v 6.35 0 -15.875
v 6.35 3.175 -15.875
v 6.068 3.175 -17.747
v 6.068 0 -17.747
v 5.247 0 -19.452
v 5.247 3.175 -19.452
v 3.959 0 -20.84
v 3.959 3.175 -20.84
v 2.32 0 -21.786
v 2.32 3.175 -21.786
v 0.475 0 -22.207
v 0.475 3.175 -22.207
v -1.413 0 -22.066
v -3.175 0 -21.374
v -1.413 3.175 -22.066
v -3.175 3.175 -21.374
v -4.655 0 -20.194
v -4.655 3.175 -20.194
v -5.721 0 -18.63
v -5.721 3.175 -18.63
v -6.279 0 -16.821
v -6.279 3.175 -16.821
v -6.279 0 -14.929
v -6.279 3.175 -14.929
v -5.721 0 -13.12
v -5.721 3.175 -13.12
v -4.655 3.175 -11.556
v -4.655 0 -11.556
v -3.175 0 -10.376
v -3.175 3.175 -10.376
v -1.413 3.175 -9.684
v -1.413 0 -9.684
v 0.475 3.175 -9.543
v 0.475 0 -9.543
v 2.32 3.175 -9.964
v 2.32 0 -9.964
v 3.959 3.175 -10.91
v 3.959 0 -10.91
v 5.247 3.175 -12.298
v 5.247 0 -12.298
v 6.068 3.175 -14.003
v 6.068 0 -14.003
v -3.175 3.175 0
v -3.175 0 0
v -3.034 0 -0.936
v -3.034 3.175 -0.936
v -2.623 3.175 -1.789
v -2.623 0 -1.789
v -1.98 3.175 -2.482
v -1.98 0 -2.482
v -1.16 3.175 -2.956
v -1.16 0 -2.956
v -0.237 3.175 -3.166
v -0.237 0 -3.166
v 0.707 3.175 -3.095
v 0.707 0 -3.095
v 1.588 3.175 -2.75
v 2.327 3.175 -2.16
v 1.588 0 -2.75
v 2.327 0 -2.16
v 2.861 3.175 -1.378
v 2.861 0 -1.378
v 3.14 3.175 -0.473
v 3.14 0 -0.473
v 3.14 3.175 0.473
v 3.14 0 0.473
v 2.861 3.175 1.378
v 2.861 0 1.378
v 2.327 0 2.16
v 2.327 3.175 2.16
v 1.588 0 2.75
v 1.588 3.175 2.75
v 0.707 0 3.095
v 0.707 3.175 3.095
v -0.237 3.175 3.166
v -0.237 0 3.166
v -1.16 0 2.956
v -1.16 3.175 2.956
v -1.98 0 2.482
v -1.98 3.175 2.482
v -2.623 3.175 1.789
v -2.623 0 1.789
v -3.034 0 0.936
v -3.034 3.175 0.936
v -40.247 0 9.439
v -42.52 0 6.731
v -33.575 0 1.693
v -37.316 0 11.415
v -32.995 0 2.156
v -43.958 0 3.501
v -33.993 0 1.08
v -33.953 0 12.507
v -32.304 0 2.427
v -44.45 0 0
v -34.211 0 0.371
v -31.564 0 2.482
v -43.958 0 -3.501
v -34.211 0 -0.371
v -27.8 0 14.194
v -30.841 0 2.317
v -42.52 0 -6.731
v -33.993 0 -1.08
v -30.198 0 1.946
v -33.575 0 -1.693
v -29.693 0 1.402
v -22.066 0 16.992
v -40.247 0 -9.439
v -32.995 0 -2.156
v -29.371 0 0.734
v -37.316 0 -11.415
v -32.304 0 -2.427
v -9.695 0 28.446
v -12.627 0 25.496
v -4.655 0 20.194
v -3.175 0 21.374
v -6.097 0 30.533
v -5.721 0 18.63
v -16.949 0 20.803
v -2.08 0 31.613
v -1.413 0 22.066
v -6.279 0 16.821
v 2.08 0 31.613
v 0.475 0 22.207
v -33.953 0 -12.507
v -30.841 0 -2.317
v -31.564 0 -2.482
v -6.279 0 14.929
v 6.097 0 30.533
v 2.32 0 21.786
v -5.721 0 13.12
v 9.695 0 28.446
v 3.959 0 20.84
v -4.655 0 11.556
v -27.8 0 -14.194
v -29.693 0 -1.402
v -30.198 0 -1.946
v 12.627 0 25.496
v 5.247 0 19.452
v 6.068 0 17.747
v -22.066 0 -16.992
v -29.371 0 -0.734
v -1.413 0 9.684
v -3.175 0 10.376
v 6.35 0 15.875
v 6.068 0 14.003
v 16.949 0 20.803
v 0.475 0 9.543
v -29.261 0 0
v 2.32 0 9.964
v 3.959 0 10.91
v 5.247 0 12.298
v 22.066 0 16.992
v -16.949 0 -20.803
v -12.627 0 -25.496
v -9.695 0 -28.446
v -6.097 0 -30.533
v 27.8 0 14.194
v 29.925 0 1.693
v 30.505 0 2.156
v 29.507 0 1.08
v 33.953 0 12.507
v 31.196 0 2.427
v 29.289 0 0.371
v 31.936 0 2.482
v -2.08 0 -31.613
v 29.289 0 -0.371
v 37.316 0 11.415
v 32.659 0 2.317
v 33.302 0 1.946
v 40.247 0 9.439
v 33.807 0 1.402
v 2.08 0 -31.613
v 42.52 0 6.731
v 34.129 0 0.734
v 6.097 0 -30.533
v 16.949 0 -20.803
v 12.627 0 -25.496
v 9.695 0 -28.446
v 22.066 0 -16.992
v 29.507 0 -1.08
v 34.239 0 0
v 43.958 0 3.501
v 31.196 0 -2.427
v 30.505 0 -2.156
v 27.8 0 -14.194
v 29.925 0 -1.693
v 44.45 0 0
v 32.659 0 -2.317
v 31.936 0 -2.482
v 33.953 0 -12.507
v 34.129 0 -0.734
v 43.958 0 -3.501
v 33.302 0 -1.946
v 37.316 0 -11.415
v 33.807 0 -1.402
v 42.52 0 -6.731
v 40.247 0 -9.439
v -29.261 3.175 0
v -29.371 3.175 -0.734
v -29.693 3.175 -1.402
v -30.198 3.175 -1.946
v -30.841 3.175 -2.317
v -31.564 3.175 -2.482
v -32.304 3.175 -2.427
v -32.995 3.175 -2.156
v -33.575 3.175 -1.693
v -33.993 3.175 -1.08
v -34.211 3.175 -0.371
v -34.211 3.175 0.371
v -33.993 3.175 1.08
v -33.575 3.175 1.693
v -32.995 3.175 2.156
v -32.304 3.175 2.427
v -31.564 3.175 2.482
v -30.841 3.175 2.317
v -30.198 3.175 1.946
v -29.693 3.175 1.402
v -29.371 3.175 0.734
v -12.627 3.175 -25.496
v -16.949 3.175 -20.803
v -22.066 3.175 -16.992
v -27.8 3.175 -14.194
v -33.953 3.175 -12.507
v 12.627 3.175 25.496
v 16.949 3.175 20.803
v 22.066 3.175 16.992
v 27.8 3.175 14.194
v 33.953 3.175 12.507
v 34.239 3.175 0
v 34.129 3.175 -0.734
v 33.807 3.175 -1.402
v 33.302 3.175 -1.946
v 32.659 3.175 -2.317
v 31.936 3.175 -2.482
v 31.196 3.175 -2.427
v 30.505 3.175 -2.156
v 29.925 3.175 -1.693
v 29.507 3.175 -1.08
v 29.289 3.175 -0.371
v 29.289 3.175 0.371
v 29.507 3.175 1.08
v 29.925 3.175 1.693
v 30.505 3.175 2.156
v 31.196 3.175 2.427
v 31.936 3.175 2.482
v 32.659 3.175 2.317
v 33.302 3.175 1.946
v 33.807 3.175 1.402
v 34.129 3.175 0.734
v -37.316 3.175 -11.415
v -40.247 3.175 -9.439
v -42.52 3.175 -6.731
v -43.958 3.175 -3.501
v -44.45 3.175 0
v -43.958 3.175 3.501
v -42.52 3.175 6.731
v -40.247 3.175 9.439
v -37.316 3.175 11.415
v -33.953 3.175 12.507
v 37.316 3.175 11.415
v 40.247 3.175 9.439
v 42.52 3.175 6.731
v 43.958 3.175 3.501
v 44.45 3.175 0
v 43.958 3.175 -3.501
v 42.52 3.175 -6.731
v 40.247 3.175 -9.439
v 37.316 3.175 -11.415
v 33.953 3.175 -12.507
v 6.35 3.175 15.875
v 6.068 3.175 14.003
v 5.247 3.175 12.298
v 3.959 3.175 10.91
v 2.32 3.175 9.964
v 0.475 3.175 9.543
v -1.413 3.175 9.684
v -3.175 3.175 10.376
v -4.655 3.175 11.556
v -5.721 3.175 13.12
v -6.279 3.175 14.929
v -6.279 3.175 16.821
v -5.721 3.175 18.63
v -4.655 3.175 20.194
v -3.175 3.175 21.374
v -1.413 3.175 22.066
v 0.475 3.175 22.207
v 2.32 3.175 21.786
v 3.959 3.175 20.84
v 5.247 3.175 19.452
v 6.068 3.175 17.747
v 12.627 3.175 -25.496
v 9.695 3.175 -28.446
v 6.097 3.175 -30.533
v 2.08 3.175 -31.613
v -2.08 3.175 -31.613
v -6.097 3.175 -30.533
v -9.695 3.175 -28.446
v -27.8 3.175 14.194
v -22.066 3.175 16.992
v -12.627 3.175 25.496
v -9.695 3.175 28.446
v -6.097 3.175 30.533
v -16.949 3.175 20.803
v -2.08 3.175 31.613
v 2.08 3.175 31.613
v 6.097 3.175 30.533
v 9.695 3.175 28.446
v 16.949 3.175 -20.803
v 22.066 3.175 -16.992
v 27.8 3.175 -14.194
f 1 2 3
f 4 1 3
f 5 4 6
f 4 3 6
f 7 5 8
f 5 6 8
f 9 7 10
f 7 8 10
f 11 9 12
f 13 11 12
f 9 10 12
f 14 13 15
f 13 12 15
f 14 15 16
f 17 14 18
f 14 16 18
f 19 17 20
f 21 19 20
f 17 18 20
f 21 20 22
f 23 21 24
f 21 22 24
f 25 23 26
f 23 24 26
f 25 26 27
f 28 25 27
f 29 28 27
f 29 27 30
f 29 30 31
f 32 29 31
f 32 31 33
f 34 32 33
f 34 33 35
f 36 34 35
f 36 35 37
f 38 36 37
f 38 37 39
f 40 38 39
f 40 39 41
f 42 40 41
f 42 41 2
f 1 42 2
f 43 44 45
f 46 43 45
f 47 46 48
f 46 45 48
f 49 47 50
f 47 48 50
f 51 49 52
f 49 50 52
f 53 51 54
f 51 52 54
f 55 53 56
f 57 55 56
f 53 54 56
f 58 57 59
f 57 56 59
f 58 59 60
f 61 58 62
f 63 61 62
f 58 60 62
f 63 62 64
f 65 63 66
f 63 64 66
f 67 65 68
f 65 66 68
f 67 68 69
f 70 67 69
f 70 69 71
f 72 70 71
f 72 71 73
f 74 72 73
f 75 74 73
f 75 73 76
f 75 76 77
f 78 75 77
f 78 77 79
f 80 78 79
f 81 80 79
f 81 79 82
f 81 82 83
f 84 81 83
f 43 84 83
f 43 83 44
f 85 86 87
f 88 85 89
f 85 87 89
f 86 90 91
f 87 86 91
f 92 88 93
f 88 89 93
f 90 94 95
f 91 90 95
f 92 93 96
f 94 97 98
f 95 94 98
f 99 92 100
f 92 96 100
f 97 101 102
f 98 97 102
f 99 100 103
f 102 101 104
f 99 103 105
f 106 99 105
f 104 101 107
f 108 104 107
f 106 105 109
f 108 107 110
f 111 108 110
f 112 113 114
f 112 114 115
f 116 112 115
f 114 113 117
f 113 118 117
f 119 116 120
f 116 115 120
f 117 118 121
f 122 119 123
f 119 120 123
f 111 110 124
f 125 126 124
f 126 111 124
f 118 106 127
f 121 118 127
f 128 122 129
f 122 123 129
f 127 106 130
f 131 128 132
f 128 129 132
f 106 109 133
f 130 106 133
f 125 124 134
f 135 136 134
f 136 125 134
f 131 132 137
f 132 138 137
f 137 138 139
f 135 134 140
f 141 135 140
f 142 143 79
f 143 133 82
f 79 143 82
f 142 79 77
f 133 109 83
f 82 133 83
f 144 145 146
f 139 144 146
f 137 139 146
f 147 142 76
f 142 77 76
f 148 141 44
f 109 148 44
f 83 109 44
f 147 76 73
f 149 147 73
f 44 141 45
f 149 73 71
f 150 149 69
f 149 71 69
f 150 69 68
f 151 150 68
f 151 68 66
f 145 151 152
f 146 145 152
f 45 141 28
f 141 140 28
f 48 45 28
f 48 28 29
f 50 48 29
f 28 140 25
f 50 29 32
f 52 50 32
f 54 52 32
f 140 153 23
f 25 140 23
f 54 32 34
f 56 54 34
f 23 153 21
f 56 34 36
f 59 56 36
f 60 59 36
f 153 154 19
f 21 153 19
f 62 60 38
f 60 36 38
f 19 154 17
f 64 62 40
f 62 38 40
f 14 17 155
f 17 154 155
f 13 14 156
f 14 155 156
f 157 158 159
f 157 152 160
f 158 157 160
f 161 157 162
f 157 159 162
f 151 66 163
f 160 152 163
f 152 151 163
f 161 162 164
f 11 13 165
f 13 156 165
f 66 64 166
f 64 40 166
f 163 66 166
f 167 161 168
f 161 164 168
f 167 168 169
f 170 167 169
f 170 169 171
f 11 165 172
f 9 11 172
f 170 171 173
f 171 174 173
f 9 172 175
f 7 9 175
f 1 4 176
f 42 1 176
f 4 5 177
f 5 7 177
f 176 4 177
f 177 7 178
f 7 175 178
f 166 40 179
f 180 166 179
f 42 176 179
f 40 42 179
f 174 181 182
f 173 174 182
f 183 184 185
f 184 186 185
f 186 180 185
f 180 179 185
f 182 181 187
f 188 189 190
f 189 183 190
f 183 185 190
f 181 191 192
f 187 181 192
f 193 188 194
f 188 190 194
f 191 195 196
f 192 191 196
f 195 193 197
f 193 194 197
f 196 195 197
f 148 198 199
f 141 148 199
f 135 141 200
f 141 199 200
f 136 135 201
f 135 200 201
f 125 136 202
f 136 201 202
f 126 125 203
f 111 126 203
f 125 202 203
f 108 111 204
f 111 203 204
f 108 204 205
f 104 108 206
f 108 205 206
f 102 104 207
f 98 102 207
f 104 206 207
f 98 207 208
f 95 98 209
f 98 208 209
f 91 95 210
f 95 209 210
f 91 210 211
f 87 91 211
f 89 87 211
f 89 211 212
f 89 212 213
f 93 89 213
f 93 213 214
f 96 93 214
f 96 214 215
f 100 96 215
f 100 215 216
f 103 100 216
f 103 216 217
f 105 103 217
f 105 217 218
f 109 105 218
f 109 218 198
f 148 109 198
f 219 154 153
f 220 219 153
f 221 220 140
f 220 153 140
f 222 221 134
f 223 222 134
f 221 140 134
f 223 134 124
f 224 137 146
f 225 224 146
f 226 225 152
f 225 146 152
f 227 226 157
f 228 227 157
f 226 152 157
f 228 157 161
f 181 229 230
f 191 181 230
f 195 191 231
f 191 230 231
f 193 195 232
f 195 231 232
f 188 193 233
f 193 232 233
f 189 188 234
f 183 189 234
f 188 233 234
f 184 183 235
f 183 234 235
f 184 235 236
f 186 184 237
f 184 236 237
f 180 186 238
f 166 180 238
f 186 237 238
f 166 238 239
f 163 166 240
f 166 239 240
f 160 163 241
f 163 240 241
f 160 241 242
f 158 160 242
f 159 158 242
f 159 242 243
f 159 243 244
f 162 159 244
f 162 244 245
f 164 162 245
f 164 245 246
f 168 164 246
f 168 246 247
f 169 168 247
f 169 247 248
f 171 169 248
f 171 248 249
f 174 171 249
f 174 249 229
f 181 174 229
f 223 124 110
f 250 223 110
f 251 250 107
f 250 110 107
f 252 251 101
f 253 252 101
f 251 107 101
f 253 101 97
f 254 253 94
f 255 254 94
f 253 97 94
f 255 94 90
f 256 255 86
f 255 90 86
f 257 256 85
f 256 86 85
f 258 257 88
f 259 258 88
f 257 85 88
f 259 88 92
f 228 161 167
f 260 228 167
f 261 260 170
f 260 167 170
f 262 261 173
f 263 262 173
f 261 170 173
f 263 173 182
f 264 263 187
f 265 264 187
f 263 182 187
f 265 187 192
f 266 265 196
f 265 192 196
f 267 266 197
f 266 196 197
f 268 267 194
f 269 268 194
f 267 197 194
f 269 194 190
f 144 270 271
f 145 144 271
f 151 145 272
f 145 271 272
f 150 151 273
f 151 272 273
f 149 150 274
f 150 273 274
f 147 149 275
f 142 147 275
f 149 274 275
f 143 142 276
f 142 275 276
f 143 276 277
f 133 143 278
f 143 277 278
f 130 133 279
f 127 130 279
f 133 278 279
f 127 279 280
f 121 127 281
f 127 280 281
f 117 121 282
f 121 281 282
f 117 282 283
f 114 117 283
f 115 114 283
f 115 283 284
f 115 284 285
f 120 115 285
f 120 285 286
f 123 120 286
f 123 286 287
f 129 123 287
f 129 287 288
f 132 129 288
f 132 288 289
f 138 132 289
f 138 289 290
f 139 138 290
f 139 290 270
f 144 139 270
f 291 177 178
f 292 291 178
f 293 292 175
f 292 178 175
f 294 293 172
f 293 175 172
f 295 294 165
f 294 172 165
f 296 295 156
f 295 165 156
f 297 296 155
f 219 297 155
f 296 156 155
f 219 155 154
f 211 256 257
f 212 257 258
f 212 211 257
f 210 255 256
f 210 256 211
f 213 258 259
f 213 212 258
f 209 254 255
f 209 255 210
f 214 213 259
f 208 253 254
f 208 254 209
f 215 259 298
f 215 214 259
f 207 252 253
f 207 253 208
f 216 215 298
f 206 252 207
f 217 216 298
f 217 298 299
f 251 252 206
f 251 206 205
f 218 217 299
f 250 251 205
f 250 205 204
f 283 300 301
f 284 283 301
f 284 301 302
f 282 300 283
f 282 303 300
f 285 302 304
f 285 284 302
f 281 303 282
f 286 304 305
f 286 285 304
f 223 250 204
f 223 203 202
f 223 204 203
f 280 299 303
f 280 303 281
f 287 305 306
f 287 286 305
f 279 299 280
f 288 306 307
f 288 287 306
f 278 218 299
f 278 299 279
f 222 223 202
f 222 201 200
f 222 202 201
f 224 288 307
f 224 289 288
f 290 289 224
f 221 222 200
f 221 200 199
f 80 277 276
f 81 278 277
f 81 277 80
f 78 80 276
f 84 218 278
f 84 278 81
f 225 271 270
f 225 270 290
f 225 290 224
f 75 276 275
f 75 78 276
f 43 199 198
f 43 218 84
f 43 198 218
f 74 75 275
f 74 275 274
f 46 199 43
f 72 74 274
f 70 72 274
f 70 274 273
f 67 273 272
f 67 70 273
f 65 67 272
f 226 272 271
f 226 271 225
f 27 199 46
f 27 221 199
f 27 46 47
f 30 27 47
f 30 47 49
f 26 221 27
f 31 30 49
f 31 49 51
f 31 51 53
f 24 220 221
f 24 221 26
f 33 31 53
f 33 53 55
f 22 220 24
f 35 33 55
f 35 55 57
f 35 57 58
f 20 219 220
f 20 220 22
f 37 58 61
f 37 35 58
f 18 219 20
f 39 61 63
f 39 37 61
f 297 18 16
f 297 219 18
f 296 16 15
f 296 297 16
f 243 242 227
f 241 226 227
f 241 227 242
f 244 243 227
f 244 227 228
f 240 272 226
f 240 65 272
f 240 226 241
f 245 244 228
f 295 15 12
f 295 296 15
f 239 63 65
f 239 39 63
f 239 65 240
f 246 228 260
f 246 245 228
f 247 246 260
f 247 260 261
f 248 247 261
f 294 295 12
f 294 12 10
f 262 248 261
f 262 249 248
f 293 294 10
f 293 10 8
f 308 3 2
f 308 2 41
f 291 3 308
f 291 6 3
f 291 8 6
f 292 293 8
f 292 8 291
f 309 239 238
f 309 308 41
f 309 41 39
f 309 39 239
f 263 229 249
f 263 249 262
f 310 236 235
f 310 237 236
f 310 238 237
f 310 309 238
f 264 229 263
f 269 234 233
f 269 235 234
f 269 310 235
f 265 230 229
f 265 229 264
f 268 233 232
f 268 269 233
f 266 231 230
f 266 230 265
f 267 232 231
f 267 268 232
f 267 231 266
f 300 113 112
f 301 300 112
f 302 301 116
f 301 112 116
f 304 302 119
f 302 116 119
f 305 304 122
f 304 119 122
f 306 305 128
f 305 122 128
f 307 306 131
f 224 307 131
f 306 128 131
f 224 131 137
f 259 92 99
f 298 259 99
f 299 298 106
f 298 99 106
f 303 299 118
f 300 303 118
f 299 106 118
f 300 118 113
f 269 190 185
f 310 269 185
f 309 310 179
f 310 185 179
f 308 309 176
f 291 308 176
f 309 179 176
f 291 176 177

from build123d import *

# Parameters (mm, degrees)
BOSS_EXTRUDE1_DEPTH         = 3.175
F_1_4_0_25_DIAMETER_HOLE1_D = 6.35
SKETCH5_R                   = 6.35
CUT_EXTRUDE1_DEPTH          = 4.175
SKETCH6_R                   = 2.4892
CUT_EXTRUDE2_DEPTH          = 4.175


with BuildPart() as part:
    # Sketch1 → Boss-Extrude1 (new body)
    with BuildSketch(Plane(origin=(0, 0, 0), x_dir=(1, 0, 0), z_dir=(0, 1, 0))):
        with BuildLine():
            ThreePointArc((12.62743016, 25.495999561), (0, 31.75), (-12.62743016, 25.495999561))
            ThreePointArc((-12.62743016, 25.495999561), (-22.066120108, 16.991504417), (-33.953426839, 12.50739422))
            ThreePointArc((-33.953426839, 12.50739422), (-44.45, 0), (-33.953426839, -12.50739422))
            ThreePointArc((-33.953426839, -12.50739422), (-22.066120108, -16.991504417), (-12.62743016, -25.495999561))
            ThreePointArc((-12.62743016, -25.495999561), (0, -31.75), (12.62743016, -25.495999561))
            ThreePointArc((12.62743016, -25.495999561), (22.066120108, -16.991504417), (33.953426839, -12.50739422))
            ThreePointArc((33.953426839, -12.50739422), (44.45, 0), (33.953426839, 12.50739422))
            ThreePointArc((33.953426839, 12.50739422), (22.066120108, 16.991504417), (12.62743016, 25.495999561))
        make_face()
    extrude(amount=BOSS_EXTRUDE1_DEPTH)

    # 1/4 (0.25) Diameter Hole1 (through all)
    with Locations(Plane(origin=(0, 3.175, 0), x_dir=(1, 0, 0), z_dir=(0, 1, 0))):
        with Locations((0, 0)):
            Hole(F_1_4_0_25_DIAMETER_HOLE1_D / 2)

    # Sketch5 → Cut-Extrude1 (cut, through all)
    with BuildSketch(Plane(origin=(0, 3.175, 0), x_dir=(1, 0, 0), z_dir=(0, 1, 0))):
        with Locations((0, 15.875)):
            Circle(SKETCH5_R)
        with Locations((0, -15.875)):
            Circle(SKETCH5_R)
    extrude(amount=-CUT_EXTRUDE1_DEPTH, mode=Mode.SUBTRACT)

    # Sketch6 → Cut-Extrude2 (cut, through all)
    with BuildSketch(Plane(origin=(0, 3.175, 0), x_dir=(1, 0, 0), z_dir=(0, 1, 0))):
        with Locations((-31.75, 0)):
            Circle(SKETCH6_R)
        with Locations((31.75, 0)):
            Circle(SKETCH6_R)
    extrude(amount=-CUT_EXTRUDE2_DEPTH, mode=Mode.SUBTRACT)


solid = part.part
